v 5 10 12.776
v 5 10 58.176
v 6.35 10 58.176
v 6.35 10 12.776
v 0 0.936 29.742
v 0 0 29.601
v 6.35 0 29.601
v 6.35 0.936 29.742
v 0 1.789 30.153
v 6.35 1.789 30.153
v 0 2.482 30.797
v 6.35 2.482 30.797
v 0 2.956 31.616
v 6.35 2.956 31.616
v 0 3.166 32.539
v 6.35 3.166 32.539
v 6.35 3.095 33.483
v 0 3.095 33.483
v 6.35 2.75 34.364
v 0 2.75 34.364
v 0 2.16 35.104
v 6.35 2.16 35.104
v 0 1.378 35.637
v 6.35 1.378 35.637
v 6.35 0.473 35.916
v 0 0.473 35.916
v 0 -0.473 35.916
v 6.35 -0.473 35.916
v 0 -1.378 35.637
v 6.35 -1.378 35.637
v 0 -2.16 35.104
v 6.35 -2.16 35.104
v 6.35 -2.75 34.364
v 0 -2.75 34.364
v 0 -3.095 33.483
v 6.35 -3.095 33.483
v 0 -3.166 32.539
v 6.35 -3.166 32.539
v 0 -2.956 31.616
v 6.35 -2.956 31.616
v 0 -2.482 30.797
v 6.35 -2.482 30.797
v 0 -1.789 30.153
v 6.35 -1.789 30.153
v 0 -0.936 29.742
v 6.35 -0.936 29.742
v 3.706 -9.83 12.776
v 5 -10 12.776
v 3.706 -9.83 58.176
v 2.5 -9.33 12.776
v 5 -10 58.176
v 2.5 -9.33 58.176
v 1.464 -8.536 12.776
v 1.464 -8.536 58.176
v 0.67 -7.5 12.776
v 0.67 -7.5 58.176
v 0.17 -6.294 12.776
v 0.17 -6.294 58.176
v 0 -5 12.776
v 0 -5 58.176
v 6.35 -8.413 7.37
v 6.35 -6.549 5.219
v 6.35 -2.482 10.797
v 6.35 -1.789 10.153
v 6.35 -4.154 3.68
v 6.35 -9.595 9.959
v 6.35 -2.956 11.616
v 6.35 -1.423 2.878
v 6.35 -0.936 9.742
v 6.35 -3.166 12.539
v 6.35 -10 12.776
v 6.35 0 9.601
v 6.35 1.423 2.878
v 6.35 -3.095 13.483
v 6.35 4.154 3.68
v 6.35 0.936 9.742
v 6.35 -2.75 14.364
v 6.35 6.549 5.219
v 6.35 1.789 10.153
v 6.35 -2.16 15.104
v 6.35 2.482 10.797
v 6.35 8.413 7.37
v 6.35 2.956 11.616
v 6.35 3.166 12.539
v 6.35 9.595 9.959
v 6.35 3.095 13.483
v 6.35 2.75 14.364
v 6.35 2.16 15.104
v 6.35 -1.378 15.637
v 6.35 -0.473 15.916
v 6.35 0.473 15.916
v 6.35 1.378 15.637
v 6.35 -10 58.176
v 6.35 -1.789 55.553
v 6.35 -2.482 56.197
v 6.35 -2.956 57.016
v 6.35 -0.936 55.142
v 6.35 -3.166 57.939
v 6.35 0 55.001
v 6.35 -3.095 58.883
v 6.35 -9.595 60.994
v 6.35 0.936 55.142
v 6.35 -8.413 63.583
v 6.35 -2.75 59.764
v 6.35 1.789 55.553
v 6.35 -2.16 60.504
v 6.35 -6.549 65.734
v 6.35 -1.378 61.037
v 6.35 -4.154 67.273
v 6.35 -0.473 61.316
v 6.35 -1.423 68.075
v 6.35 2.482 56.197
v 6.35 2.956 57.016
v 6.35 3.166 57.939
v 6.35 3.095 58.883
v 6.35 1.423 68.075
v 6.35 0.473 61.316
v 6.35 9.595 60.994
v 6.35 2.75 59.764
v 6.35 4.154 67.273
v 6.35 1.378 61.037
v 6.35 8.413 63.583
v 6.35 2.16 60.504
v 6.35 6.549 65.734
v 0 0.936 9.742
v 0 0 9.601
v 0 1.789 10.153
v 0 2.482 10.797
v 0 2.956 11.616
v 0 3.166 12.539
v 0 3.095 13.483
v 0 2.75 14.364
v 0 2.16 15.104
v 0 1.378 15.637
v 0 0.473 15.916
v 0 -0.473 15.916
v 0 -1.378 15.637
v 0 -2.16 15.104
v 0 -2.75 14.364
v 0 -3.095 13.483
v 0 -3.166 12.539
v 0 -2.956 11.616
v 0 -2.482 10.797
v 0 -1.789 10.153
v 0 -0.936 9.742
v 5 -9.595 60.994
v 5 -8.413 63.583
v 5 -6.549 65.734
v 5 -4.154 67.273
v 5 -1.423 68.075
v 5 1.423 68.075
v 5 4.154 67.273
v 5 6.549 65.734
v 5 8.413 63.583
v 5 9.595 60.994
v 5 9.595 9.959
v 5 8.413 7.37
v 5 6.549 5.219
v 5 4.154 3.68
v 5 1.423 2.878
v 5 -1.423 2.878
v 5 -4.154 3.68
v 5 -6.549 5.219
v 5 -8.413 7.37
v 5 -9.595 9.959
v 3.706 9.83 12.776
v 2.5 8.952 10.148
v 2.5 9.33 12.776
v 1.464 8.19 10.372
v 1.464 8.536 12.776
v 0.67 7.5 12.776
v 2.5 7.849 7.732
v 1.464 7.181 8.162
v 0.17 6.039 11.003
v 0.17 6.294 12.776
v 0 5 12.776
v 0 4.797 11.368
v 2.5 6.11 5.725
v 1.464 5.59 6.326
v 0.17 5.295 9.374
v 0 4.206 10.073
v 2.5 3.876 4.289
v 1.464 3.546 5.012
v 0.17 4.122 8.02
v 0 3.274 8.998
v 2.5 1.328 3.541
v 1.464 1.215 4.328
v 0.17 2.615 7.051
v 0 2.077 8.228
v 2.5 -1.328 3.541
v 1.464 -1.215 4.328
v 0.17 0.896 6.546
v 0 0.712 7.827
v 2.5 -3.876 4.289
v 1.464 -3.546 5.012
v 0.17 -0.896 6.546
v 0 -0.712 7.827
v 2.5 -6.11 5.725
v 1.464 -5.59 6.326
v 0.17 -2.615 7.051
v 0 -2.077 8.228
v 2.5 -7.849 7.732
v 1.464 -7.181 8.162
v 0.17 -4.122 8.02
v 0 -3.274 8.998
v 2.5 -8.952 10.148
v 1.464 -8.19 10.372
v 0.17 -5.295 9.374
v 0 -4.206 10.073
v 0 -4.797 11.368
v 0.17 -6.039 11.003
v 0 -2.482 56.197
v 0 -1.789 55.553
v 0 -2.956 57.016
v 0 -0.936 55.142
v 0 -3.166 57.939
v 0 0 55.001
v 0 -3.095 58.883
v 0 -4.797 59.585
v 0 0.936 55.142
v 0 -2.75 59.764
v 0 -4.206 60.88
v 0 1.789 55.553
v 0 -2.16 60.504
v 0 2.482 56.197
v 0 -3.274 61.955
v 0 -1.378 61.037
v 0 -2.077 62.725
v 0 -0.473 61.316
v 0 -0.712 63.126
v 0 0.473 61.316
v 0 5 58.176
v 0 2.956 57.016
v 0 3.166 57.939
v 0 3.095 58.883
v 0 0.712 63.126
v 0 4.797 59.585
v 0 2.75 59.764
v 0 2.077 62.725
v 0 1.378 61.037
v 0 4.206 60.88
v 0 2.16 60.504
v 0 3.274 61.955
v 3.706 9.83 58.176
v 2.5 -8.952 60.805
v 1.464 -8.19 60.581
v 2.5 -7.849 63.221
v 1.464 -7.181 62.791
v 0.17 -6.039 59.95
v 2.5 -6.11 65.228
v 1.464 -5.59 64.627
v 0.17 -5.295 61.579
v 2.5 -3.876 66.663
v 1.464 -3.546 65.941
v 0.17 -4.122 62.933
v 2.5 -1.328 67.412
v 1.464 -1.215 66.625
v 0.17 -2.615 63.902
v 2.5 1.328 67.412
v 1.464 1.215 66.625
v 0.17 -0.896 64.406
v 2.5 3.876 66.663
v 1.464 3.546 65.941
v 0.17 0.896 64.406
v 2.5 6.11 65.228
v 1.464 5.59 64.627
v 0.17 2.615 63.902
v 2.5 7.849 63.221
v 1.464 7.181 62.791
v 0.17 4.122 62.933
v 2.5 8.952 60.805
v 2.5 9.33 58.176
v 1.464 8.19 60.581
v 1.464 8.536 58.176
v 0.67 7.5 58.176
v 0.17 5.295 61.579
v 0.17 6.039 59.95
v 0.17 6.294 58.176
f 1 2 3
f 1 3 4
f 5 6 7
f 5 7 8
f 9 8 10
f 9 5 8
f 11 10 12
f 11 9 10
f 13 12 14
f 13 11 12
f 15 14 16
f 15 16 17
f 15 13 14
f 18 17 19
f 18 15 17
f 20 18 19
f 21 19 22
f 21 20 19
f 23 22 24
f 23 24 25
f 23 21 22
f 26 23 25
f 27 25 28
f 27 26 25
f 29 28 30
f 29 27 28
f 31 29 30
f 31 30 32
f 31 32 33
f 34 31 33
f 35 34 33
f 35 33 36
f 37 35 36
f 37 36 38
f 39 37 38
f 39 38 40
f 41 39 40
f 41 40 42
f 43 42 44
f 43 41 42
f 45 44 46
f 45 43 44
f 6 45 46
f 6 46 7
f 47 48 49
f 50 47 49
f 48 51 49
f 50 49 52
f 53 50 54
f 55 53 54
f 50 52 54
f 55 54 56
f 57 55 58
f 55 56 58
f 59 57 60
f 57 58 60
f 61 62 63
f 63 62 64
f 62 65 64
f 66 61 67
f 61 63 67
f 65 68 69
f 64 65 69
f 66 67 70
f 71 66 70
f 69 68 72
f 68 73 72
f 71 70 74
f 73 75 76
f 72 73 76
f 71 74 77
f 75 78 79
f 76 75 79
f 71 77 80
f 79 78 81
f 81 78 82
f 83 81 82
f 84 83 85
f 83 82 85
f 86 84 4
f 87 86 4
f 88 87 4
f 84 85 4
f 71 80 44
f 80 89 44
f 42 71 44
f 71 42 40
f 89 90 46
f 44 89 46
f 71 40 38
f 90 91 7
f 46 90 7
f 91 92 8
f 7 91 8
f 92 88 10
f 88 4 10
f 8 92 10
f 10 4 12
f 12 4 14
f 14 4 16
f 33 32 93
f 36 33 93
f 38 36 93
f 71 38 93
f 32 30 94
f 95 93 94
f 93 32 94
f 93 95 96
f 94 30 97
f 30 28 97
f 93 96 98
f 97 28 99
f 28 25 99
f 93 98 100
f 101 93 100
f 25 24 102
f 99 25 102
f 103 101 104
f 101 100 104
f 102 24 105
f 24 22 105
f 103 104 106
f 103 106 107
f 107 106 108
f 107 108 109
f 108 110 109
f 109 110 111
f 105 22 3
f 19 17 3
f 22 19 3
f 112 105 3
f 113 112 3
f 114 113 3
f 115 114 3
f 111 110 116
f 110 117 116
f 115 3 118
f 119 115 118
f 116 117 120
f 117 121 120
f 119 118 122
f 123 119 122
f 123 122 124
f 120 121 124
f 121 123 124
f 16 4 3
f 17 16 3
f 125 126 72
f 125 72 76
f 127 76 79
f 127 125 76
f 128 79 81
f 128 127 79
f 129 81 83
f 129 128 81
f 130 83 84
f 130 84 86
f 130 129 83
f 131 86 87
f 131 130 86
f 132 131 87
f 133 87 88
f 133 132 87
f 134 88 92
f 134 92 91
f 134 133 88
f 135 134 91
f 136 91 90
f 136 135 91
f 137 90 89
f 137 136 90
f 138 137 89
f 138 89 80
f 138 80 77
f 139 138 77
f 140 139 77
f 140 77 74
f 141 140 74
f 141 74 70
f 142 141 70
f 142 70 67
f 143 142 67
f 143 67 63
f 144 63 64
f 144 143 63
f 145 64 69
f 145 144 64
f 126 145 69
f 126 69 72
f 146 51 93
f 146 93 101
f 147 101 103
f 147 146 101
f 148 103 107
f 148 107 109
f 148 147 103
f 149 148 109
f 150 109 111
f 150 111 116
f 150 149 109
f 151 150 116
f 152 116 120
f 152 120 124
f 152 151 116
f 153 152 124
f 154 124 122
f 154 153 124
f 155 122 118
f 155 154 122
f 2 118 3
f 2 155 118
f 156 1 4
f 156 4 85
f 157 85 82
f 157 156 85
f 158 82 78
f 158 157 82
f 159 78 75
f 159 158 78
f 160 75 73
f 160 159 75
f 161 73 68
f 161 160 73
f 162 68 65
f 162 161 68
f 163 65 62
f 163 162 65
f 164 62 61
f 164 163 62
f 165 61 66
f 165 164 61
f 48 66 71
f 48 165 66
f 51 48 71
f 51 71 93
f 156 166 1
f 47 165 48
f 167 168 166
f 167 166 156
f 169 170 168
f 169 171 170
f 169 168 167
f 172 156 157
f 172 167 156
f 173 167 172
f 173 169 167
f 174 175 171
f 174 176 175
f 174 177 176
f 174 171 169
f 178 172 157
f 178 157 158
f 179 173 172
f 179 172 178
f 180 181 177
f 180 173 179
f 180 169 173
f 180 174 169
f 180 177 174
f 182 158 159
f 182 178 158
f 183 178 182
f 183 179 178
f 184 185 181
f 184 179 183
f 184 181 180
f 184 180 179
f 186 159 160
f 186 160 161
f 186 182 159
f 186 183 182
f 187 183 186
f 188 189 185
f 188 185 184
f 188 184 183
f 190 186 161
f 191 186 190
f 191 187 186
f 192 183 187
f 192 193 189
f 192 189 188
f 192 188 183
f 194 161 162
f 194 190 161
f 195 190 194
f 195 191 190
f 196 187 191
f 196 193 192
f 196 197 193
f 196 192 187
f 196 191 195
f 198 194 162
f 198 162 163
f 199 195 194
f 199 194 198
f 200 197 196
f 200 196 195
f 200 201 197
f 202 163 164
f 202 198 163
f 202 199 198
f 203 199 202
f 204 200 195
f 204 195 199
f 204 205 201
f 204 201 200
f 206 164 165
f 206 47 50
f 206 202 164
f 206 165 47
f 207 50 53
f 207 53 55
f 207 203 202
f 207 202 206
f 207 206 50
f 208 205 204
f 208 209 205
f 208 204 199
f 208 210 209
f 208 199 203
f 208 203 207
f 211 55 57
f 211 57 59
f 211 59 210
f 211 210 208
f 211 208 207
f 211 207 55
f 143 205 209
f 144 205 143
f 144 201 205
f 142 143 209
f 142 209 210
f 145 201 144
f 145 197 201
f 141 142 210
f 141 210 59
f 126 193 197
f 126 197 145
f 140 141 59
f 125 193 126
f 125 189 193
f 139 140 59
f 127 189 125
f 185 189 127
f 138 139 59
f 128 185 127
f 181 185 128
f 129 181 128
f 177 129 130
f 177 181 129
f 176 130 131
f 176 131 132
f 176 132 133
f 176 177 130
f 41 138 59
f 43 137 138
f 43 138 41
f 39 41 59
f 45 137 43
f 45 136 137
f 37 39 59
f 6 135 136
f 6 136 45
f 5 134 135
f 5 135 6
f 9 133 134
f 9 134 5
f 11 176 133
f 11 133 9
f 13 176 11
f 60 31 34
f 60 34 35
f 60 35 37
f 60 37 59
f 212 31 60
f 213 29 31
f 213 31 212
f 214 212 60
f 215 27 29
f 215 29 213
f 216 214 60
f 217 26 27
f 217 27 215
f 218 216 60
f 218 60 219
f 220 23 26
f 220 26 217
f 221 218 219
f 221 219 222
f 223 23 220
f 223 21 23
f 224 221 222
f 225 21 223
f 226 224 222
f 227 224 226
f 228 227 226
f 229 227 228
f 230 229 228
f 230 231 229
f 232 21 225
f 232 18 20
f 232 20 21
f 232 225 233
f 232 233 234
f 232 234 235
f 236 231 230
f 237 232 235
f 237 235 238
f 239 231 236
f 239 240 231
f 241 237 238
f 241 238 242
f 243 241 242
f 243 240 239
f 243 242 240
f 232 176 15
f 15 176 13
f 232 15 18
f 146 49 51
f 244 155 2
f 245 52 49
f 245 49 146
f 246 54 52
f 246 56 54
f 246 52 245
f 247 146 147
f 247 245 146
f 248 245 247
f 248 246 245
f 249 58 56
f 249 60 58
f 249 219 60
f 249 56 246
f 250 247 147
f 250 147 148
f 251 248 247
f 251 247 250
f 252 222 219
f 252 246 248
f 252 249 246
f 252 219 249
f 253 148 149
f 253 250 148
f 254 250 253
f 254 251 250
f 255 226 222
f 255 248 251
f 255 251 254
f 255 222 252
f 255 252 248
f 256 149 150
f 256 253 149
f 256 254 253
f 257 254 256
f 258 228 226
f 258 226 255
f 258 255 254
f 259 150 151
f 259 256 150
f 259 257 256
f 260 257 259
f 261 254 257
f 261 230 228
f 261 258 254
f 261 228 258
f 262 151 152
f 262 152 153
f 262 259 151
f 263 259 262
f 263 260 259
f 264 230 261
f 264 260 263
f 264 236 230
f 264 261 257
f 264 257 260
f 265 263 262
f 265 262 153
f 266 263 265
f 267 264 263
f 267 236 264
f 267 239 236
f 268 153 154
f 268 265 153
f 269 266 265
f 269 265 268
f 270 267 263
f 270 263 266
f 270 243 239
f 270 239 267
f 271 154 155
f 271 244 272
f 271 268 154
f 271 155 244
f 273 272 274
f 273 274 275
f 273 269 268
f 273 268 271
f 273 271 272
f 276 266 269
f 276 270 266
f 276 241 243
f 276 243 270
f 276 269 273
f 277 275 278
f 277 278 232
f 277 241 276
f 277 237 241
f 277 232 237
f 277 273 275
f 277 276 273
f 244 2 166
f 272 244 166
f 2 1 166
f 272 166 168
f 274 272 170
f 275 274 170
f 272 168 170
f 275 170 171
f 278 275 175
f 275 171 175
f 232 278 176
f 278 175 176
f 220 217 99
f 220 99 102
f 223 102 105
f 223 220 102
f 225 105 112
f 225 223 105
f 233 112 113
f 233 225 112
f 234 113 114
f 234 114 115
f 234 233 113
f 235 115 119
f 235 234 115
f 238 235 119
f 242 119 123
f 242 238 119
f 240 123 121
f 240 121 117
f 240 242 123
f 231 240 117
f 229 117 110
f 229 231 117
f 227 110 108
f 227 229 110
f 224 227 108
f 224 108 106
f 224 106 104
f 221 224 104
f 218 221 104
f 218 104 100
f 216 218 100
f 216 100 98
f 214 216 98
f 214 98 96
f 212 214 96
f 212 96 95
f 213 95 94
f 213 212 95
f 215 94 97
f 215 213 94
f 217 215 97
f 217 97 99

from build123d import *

# Parameters (mm, degrees)
SKETCH2_R           = 3.175
BOSS_EXTRUDE1_DEPTH = 6.35
FILLET1_R           = 5


with BuildPart() as part:
    # Sketch2 → Boss-Extrude1 (new body)
    with BuildSketch(Plane(origin=(0, 0, 0), x_dir=(0, 0, -1), z_dir=(1, 0, 0))):
        with BuildLine():
            Line((-58.176437282, 10), (-12.776437282, 10))
            ThreePointArc((-12.776437282, 10), (-2.776437282, 0), (-12.776437282, -10))
            Line((-12.776437282, -10), (-58.176437282, -10))
            ThreePointArc((-58.176437282, -10), (-68.176437282, 0), (-58.176437282, 10))
        make_face()
        with Locations((-32.776437282, 0)):
            Circle(SKETCH2_R, mode=Mode.SUBTRACT)
        with Locations((-12.776437282, 0)):
            Circle(SKETCH2_R, mode=Mode.SUBTRACT)
        with Locations((-58.176437282, 0)):
            Circle(SKETCH2_R, mode=Mode.SUBTRACT)
    extrude(amount=BOSS_EXTRUDE1_DEPTH)

    # Fillet1
    fillet1_edges = [part.edges().sort_by_distance(p)[0] for p in [
        (0, 10, 35.476437282),
        (0, 0, 2.776437282),
        (0, -10, 35.476437282),
        (0, 0, 68.176437282),
    ]]
    fillet(fillet1_edges, radius=FILLET1_R)


solid = part.part
